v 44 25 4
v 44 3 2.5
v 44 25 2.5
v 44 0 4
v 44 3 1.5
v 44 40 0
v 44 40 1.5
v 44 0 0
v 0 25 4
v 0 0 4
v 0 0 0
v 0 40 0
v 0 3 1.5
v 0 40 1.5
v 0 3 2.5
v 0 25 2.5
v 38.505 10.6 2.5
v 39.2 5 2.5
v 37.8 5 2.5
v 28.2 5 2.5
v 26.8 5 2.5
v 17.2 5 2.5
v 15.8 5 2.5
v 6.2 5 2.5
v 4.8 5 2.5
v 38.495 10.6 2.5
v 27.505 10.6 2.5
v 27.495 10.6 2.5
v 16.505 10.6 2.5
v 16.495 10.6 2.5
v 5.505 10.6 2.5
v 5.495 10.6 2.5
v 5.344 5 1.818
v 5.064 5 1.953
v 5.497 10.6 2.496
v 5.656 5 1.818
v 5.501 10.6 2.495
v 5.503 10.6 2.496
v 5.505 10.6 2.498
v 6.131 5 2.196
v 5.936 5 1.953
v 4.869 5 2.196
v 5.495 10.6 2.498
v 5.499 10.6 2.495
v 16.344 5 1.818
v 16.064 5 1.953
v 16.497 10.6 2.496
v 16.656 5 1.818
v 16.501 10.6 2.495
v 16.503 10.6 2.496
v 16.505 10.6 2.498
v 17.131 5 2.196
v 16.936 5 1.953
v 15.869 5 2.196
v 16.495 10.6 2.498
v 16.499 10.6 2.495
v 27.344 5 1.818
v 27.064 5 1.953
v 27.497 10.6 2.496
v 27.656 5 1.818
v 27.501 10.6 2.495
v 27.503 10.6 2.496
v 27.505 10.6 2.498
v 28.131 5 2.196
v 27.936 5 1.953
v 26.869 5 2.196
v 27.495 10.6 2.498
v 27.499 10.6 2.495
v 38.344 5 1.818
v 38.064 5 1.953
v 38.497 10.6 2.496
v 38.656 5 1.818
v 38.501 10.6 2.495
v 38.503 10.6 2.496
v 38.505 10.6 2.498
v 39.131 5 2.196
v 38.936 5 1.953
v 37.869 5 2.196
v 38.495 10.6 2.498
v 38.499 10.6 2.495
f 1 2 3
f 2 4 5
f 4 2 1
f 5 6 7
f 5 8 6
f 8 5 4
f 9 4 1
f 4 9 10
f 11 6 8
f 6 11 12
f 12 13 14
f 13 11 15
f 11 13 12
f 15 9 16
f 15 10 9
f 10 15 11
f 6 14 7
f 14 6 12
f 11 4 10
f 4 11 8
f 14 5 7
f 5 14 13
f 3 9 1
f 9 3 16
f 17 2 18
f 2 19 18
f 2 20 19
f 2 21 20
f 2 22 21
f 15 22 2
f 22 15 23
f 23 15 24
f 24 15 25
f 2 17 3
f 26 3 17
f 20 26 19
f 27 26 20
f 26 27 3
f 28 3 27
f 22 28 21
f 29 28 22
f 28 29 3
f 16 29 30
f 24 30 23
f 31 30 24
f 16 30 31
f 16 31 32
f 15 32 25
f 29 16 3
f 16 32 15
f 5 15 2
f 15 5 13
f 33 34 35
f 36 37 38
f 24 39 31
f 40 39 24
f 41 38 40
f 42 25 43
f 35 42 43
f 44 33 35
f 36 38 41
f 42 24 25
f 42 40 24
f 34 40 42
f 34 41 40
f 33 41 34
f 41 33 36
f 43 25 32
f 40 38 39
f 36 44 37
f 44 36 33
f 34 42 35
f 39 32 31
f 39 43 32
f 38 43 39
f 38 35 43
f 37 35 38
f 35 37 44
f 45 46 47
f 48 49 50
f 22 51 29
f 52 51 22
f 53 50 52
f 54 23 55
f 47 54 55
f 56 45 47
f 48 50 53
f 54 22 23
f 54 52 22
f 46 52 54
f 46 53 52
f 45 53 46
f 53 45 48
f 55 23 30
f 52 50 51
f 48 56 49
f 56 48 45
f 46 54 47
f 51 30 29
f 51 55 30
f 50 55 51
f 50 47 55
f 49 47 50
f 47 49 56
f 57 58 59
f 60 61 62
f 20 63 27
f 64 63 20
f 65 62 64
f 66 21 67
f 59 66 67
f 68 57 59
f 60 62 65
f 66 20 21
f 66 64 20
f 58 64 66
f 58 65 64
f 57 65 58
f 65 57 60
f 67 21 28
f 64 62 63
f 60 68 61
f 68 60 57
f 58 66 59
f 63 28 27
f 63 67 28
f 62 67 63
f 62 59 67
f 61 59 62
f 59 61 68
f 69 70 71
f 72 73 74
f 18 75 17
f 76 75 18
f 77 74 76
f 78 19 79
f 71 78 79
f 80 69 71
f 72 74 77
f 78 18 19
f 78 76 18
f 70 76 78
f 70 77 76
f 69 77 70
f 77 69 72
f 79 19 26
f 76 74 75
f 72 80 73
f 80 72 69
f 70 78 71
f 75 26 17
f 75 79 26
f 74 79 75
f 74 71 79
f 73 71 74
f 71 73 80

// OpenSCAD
/*
    Drziak na fotky s trnmi
 */

$fn = 14;

module holder(width, heightBack, heightFront, depth, opening, pins = 0, sideWall = 0) {
    spodnaHrana = 3;
    prekrytie = 5;
    hrubkaSteny = (depth - opening) / 2;
    diameter = opening * 1.4;

    union() {
        difference() {
            cube([width, heightBack, depth]);
            translate([0, heightFront, hrubkaSteny]) cube([width, heightBack, depth]);
            translate([sideWall, spodnaHrana, hrubkaSteny]) cube([width-2*sideWall, heightBack, opening]);
        }
        // Pins
        step = width / pins;
        for (i = [0:1:pins - 1]) {
            translate([i * step + step / 2, spodnaHrana + 2, depth - hrubkaSteny])
                rotate([- 90, 0, 0])
                    cylinder(h = 4 * diameter, d1 = diameter, d2 = 0.01);
        }

    }
}


holder(width = 44, heightBack = 40, heightFront = 25, depth = 4, opening = 1, pins = 4, sideWall = 0);
